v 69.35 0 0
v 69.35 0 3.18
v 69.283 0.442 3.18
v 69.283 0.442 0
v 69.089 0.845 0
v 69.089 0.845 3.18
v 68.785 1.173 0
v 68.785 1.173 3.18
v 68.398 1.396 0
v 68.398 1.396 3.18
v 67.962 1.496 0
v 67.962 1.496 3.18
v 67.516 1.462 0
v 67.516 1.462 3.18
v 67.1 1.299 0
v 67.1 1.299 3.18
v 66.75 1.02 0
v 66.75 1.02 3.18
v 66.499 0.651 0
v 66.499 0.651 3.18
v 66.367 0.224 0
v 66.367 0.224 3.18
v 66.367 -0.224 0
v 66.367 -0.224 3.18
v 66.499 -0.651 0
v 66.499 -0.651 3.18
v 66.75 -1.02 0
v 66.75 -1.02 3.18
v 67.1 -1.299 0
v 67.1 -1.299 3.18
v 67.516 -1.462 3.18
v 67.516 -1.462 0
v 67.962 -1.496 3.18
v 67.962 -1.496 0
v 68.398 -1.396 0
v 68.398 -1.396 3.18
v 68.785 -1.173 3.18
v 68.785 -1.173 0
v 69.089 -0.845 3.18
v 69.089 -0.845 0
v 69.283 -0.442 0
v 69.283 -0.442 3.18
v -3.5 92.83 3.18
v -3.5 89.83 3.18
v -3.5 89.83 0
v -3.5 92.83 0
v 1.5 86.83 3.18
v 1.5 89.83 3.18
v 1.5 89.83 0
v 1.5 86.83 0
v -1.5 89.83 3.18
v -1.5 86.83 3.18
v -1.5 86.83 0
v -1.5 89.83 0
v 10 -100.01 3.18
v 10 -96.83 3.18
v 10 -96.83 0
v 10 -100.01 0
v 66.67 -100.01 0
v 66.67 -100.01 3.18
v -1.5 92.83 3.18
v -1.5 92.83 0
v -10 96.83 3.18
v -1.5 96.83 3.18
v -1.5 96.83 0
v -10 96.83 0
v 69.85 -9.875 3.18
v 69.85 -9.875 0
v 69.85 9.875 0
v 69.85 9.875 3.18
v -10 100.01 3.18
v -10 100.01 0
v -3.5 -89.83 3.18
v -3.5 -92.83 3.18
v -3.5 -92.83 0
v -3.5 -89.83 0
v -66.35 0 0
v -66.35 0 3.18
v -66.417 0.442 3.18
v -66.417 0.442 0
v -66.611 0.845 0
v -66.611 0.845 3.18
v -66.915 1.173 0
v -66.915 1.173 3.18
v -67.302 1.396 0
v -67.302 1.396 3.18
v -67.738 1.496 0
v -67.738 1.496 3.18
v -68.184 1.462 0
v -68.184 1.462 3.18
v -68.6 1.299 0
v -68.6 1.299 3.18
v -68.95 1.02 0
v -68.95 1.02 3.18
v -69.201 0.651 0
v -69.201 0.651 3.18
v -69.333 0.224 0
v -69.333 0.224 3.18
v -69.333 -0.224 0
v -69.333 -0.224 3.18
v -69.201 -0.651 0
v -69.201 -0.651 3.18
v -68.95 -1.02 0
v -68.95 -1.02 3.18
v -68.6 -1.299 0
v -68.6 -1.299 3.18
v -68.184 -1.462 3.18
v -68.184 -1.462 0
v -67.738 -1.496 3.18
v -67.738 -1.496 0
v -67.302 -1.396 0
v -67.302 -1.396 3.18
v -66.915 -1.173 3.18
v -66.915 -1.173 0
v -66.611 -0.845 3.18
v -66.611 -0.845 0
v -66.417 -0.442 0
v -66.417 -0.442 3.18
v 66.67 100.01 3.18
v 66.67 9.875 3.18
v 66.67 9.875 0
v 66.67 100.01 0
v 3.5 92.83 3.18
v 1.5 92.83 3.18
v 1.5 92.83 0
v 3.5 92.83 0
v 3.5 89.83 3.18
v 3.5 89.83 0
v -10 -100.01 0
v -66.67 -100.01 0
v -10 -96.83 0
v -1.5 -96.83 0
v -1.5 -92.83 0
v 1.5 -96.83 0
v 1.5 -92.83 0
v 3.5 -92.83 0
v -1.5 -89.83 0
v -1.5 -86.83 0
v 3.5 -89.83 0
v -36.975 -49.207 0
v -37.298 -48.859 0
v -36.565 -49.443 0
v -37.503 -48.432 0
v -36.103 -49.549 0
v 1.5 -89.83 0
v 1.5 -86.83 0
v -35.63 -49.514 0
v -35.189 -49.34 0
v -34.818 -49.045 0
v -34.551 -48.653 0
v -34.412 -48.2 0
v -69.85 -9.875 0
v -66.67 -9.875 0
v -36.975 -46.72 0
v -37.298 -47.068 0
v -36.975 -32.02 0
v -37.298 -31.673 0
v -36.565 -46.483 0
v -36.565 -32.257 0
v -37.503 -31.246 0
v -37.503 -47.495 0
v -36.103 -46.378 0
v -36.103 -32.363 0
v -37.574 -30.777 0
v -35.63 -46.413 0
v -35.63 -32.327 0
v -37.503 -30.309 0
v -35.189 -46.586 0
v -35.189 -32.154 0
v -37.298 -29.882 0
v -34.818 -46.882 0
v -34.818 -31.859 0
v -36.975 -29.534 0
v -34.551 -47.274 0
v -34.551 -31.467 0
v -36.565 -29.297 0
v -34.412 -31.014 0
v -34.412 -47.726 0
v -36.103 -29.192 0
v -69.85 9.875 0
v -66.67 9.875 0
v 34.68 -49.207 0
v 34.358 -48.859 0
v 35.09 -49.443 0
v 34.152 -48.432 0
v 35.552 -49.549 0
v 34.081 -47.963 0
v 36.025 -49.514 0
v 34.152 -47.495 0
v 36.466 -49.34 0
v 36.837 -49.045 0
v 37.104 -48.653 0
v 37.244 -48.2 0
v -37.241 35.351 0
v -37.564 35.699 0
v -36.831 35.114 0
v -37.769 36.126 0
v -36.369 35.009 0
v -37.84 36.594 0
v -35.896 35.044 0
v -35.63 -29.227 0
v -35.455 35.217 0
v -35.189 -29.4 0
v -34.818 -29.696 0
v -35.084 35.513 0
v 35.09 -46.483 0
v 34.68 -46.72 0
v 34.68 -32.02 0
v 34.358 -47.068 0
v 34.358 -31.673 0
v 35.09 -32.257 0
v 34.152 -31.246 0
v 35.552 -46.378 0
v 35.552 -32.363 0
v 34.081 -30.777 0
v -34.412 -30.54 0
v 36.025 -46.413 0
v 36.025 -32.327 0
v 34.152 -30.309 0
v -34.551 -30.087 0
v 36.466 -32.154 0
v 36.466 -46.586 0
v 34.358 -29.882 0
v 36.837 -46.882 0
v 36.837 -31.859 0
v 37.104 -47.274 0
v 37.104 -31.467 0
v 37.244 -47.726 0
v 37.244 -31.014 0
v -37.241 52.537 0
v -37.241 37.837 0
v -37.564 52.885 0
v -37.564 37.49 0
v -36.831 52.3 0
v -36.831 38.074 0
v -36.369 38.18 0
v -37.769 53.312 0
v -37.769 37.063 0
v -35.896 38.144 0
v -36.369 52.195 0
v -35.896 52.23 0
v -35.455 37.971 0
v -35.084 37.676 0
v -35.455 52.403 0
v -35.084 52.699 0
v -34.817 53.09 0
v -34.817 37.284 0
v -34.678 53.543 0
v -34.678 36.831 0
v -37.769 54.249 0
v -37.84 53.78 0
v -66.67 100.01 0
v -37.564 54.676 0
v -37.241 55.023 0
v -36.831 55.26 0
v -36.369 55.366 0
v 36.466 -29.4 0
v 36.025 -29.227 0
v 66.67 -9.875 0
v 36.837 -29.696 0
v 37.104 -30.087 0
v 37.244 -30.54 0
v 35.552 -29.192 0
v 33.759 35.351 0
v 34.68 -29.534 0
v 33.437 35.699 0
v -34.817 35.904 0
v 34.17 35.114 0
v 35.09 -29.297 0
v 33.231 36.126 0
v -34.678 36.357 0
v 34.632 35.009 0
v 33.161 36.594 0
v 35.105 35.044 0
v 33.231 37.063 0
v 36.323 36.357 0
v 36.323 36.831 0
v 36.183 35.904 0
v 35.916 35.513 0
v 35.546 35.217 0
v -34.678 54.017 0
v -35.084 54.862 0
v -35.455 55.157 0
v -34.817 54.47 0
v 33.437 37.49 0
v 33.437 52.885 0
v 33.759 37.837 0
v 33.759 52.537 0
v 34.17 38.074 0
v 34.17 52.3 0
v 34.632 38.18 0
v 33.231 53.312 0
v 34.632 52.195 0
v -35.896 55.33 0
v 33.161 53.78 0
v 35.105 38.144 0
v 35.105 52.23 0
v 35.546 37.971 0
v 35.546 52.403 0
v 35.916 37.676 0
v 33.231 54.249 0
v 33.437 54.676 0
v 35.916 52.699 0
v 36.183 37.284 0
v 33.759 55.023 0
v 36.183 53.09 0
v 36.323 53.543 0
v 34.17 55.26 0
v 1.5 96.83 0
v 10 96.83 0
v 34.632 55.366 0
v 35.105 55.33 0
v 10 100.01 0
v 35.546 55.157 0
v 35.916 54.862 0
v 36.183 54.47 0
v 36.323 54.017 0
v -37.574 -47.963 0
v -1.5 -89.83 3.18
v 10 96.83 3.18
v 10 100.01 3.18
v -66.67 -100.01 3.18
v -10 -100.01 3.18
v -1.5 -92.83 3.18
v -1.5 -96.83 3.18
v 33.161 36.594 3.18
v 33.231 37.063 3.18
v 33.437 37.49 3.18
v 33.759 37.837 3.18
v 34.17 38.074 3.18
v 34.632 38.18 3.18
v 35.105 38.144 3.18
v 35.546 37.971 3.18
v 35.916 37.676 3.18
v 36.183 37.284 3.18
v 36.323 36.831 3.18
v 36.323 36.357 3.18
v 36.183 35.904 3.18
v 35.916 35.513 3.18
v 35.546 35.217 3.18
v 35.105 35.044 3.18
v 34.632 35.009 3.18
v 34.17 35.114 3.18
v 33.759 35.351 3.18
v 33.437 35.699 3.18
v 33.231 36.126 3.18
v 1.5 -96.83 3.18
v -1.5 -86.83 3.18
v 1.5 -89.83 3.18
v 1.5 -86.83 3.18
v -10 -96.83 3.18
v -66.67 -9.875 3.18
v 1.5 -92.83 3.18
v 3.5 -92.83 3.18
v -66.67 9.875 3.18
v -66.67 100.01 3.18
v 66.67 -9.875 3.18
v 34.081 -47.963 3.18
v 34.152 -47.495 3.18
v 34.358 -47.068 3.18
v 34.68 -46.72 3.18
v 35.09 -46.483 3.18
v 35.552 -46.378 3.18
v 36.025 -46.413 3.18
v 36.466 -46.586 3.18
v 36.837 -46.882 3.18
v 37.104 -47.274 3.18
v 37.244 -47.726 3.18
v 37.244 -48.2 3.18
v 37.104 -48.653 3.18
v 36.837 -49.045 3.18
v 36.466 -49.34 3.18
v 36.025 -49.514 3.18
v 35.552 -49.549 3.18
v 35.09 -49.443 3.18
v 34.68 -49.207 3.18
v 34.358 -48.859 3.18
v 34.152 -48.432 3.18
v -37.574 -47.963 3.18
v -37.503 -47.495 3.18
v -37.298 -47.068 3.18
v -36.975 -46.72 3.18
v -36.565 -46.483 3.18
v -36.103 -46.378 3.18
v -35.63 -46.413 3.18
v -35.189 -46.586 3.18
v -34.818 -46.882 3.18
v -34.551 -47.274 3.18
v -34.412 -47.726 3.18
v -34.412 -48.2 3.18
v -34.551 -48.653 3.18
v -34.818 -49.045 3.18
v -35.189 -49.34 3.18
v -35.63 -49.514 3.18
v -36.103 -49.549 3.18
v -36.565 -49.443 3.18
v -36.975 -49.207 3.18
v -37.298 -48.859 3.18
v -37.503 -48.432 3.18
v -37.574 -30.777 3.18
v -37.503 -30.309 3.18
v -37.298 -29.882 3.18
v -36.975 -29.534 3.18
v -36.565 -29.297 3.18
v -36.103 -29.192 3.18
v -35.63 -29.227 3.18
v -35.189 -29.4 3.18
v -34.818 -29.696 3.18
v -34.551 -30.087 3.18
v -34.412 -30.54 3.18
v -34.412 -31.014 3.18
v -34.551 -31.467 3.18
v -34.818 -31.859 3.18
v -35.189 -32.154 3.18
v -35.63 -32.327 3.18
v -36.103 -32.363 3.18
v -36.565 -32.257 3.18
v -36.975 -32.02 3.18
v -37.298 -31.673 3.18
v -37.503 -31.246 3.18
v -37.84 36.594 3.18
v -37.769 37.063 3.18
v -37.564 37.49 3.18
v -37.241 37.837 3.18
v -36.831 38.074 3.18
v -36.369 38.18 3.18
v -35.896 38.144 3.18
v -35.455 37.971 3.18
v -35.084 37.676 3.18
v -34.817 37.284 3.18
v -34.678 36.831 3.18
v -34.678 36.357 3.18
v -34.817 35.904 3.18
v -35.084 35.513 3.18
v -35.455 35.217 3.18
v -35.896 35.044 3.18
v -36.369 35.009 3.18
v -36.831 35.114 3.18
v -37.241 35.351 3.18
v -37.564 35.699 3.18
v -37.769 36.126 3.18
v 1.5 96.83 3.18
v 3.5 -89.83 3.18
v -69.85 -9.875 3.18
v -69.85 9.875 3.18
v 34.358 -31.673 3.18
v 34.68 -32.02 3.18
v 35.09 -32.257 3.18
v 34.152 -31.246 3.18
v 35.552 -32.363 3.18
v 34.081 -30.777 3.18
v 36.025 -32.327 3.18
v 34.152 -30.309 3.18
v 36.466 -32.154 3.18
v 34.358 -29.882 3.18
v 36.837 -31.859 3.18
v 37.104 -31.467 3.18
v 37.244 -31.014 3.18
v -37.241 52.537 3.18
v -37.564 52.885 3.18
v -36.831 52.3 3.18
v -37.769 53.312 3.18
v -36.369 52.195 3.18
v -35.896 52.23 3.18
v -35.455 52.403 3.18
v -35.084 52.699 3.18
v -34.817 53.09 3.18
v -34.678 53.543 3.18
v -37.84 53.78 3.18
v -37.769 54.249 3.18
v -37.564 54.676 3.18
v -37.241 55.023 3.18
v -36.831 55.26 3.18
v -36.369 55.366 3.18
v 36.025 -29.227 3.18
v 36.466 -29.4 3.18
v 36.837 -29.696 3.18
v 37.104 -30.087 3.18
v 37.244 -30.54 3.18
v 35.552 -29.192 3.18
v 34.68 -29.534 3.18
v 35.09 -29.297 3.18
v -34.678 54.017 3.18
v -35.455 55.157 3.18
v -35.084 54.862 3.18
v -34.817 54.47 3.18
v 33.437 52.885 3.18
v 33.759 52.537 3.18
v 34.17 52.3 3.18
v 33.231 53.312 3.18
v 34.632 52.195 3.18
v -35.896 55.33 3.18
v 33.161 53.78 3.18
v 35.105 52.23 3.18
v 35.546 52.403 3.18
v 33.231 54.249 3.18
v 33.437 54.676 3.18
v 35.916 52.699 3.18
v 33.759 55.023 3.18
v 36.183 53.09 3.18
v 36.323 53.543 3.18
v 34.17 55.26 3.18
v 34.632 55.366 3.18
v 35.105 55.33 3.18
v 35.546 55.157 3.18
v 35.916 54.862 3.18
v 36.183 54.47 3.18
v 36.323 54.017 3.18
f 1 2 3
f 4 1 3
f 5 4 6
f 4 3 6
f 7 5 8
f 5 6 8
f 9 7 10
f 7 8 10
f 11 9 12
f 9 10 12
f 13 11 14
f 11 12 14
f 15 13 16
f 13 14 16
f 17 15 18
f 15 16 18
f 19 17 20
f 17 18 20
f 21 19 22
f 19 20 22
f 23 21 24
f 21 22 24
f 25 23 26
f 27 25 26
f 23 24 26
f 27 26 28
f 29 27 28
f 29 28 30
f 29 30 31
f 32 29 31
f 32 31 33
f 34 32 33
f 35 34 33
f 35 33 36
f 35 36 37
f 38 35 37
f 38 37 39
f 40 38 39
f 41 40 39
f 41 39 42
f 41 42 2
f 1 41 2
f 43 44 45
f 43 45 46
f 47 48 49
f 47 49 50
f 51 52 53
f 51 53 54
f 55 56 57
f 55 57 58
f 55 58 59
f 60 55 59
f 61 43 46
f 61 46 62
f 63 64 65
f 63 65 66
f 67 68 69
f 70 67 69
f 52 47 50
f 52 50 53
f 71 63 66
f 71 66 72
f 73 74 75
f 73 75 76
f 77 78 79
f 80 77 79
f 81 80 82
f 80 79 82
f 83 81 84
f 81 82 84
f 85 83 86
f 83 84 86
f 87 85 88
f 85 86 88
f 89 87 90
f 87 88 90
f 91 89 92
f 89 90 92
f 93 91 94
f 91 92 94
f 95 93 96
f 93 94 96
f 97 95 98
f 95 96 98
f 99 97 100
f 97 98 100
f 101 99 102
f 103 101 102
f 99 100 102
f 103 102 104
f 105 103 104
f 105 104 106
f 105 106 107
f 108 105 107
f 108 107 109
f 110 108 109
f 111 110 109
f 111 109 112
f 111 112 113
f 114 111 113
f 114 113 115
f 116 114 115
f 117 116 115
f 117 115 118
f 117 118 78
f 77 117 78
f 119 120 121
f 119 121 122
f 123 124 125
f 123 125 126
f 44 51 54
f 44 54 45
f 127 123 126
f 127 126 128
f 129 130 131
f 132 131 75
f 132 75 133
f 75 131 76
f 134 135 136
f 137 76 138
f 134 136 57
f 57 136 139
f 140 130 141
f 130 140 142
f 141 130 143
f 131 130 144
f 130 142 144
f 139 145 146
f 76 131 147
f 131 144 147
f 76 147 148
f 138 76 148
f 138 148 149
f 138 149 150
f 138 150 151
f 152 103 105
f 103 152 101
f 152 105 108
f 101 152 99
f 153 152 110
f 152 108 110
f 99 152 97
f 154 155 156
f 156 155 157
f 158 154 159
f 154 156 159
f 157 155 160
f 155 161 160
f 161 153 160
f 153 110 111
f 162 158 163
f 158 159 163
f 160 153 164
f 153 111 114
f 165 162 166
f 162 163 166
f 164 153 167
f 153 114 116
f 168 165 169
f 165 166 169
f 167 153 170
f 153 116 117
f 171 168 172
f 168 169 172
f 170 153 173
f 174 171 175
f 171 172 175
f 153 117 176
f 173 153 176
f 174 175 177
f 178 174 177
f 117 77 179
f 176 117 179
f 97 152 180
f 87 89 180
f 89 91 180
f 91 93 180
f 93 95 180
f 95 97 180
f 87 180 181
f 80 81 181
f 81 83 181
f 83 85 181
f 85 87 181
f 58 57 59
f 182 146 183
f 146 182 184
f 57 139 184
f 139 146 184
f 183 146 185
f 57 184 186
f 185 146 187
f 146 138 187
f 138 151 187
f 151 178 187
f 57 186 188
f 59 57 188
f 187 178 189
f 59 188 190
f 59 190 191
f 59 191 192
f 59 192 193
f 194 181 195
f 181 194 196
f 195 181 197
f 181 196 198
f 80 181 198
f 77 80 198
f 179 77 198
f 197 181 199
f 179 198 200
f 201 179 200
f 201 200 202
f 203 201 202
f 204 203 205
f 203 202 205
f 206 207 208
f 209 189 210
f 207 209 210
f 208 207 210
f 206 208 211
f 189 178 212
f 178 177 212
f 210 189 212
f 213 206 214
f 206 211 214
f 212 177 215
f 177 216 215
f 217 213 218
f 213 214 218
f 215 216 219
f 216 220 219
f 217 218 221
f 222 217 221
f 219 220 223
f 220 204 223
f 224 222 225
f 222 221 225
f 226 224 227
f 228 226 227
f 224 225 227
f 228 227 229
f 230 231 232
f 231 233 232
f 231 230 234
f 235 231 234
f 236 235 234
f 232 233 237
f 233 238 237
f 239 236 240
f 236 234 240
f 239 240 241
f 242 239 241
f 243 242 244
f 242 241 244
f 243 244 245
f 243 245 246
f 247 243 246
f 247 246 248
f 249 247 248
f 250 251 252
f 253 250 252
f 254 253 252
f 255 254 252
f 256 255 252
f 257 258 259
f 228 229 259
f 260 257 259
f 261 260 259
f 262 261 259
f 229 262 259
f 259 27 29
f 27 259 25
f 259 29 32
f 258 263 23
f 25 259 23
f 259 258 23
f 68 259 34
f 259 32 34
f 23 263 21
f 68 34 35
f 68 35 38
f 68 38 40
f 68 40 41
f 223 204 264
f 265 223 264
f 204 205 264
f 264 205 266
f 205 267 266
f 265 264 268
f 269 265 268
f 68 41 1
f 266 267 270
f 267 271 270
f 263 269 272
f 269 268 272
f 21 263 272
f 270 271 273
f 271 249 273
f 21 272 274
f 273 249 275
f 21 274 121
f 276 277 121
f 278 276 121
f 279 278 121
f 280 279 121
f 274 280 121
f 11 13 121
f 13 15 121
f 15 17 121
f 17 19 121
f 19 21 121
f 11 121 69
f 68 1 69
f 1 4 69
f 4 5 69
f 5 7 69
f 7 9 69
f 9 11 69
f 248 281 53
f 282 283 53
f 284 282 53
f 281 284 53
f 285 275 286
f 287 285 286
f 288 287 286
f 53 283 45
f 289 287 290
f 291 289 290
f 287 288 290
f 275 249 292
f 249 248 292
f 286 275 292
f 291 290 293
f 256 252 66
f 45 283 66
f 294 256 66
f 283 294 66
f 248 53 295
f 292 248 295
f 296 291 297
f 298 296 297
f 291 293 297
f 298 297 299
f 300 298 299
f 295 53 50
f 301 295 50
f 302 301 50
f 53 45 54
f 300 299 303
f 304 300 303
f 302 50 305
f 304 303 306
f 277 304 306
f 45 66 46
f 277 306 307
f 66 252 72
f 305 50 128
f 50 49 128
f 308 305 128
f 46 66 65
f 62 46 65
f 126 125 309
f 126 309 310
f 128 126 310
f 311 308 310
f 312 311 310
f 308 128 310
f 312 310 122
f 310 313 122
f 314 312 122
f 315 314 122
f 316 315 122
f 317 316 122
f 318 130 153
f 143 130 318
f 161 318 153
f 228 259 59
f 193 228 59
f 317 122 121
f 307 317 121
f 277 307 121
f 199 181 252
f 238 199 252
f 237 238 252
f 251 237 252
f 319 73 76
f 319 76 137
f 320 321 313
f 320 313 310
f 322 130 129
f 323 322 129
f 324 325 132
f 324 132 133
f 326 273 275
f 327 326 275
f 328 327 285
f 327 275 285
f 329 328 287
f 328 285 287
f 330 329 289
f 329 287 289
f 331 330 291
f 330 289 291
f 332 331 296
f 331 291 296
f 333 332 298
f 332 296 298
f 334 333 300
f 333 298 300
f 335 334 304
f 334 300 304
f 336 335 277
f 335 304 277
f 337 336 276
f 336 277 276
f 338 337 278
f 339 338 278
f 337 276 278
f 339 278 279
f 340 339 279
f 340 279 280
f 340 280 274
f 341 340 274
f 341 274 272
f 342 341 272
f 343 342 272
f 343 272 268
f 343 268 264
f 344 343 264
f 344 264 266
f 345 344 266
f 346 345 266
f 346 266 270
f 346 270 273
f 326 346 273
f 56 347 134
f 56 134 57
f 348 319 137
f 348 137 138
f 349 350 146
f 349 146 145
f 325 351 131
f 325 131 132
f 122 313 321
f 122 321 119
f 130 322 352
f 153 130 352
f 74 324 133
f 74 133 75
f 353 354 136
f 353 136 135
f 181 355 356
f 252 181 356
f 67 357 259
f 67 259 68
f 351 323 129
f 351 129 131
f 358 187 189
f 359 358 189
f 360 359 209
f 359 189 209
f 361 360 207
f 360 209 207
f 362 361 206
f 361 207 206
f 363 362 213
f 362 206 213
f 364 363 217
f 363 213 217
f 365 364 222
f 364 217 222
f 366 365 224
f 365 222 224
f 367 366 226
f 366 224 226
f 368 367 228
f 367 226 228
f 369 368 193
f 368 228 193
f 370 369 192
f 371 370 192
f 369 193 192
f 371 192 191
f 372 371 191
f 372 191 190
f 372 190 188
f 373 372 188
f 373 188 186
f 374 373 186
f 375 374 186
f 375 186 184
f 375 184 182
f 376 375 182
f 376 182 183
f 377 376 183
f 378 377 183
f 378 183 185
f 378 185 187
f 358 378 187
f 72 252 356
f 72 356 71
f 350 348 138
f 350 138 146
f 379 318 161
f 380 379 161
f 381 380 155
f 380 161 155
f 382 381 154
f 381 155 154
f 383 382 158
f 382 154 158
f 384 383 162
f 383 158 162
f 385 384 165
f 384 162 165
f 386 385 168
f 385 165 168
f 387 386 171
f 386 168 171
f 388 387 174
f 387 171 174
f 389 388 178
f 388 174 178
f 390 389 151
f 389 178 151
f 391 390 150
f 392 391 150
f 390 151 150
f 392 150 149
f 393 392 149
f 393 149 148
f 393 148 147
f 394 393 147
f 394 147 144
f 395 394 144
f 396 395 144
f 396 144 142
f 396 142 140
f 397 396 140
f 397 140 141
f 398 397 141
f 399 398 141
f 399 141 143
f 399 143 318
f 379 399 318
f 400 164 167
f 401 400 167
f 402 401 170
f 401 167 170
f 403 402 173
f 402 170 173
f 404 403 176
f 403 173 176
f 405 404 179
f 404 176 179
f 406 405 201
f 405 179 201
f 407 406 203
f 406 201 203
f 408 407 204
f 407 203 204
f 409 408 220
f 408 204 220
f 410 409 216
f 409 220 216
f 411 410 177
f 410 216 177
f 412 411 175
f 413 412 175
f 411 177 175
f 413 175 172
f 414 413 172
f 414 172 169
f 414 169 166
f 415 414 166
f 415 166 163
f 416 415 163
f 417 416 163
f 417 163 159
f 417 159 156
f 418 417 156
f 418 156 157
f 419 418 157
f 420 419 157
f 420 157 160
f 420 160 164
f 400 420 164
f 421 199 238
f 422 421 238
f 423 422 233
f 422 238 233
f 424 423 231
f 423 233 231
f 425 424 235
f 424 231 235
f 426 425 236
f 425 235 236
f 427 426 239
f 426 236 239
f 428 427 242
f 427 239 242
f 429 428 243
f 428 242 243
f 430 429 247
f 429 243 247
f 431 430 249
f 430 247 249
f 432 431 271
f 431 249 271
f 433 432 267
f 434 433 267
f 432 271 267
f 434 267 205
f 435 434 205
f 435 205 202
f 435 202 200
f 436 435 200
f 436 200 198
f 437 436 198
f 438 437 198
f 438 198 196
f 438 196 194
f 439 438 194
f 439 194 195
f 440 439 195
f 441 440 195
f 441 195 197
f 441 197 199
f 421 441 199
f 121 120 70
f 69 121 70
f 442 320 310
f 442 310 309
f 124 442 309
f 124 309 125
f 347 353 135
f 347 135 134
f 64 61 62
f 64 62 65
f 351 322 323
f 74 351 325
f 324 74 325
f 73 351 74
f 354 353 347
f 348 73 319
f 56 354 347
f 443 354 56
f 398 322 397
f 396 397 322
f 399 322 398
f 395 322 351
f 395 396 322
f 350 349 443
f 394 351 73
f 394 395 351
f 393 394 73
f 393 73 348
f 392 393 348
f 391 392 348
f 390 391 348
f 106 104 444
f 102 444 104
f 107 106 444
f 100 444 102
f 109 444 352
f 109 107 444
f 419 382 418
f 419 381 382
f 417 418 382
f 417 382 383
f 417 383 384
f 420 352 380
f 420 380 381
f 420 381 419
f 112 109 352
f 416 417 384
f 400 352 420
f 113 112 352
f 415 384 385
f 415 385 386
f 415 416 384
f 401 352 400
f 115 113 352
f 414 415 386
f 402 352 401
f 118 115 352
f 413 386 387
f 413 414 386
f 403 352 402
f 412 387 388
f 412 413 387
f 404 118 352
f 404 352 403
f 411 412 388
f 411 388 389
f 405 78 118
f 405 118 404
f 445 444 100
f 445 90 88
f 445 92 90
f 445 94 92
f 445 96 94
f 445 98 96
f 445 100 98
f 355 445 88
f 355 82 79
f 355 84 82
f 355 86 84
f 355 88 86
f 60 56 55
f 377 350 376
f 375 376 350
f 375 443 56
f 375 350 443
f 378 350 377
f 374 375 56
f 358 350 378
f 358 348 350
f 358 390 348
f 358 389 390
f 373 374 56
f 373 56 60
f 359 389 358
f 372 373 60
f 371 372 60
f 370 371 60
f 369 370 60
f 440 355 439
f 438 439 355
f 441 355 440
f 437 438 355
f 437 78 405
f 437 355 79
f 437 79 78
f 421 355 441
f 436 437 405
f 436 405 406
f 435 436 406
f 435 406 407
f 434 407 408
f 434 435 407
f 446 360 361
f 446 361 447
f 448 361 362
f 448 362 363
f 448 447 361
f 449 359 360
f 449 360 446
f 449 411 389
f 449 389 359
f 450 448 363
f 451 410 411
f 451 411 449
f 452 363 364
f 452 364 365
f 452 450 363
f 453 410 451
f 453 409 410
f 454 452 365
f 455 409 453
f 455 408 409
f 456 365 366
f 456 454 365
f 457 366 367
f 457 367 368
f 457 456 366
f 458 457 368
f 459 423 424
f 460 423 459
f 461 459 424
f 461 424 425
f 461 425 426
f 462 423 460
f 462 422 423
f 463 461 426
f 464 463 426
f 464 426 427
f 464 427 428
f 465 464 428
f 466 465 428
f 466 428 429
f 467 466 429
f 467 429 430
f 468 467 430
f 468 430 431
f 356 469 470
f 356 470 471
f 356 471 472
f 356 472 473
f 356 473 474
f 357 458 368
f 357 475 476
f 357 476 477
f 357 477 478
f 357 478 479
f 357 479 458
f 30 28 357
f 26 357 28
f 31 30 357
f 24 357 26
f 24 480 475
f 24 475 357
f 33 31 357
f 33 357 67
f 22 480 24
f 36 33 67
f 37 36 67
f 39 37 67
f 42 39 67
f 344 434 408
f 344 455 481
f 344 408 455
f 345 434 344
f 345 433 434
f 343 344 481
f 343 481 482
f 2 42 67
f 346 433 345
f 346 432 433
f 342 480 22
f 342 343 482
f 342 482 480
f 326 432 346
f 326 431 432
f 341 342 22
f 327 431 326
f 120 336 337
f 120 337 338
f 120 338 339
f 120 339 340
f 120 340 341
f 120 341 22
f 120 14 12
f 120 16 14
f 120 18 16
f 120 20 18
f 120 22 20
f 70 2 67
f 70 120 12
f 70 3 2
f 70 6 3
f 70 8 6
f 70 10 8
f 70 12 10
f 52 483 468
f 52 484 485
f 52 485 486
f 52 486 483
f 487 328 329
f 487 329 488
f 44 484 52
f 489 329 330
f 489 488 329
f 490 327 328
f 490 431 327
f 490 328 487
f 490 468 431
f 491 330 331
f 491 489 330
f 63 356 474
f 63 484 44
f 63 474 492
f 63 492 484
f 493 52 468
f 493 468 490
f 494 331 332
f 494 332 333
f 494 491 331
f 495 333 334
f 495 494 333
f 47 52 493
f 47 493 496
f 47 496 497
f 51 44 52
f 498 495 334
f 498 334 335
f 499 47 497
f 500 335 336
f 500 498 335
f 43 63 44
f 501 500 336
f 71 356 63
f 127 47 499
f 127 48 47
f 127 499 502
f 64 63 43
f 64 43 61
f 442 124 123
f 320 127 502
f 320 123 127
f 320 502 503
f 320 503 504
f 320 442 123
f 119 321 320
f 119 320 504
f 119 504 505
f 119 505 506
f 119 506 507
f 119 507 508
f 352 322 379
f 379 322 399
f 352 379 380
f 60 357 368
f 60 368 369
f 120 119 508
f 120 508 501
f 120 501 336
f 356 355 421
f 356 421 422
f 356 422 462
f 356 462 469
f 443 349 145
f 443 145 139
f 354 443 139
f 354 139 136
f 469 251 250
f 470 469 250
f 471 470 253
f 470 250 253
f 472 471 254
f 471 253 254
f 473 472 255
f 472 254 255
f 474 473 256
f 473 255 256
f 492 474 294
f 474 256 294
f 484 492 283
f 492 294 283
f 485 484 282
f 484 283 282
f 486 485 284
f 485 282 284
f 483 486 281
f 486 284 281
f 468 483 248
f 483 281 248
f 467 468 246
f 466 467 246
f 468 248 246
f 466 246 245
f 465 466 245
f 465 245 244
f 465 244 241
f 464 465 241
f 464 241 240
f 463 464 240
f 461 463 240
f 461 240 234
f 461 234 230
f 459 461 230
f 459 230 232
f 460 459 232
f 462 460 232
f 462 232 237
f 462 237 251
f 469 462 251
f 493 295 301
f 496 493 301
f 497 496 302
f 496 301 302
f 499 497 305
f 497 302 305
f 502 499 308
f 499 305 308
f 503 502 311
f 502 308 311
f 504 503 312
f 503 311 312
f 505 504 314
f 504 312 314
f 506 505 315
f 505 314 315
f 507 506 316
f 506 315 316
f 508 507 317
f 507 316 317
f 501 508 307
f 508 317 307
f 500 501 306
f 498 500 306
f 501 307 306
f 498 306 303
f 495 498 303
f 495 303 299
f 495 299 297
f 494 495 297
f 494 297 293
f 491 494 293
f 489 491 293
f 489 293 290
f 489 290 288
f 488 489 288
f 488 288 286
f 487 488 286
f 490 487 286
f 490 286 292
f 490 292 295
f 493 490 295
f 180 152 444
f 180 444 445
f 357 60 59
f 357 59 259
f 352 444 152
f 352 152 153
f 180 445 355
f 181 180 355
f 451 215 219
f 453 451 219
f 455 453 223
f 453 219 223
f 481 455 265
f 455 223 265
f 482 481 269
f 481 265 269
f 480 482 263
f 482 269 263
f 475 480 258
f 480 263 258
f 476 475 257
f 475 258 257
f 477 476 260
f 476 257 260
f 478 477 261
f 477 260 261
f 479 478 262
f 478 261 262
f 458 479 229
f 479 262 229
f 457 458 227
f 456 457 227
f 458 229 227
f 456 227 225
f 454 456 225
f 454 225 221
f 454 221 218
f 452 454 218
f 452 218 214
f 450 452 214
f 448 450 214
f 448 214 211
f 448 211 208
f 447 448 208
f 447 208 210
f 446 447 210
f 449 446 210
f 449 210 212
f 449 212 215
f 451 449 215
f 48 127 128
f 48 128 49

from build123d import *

# Parameters (mm, degrees)
SKETCH1_W           = 139.7
SKETCH1_H           = 200.02
BOSS_EXTRUDE1_DEPTH = 3.18
SKETCH2_R           = 1.5
SKETCH2_W           = 3.18
SKETCH2_H           = 90.135
CUT_EXTRUDE1_DEPTH  = 4.18
SKETCH3_R           = 1.59
CUT_EXTRUDE2_DEPTH  = 4.18
SKETCH4_R           = 1.59
CUT_EXTRUDE3_DEPTH  = 4.18


with BuildPart() as part:
    # Sketch1 → Boss-Extrude1 (new body)
    with BuildSketch(Plane.XY):
        Rectangle(SKETCH1_W, SKETCH1_H)
    extrude(amount=BOSS_EXTRUDE1_DEPTH)

    # Sketch2 → Cut-Extrude1 (cut, through all)
    with BuildSketch(Plane.XY.offset(3.18)):
        with Locations((-67.85, 0)):
            Circle(SKETCH2_R)
        with Locations((67.85, 0)):
            Circle(SKETCH2_R)
        Polygon((-10, 100.01), (10, 100.01), (10, 96.83), (1.5, 96.83), (1.5, 92.83), (3.5, 92.83), (3.5, 89.83), (1.5, 89.83), (1.5, 86.83), (-1.5, 86.83), (-1.5, 89.83), (-3.5, 89.83), (-3.5, 92.83), (-1.5, 92.83), (-1.5, 96.83), (-10, 96.83), align=None)
        Polygon((-10, -100.01), (-10, -96.83), (-1.5, -96.83), (-1.5, -92.83), (-3.5, -92.83), (-3.5, -89.83), (-1.5, -89.83), (-1.5, -86.83), (1.5, -86.83), (1.5, -89.83), (3.5, -89.83), (3.5, -92.83), (1.5, -92.83), (1.5, -96.83), (10, -96.83), (10, -100.01), align=None)
        with Locations((-68.26, 54.9425)):
            Rectangle(SKETCH2_W, SKETCH2_H)
        with Locations((-68.26, -54.9425)):
            Rectangle(SKETCH2_W, SKETCH2_H)
        with Locations((68.26, -54.9425)):
            Rectangle(SKETCH2_W, SKETCH2_H)
        with Locations((68.26, 54.9425)):
            Rectangle(SKETCH2_W, SKETCH2_H)
    extrude(amount=-CUT_EXTRUDE1_DEPTH, mode=Mode.SUBTRACT)

    # Sketch3 → Cut-Extrude2 (cut, through all)
    with BuildSketch(Plane(origin=(0, 0, 0), x_dir=(-1, 0, 0), z_dir=(0, 0, -1))):
        with Locations((-35.67127699, -47.963396943)):
            Circle(SKETCH3_R)
        with Locations((-35.67127699, -30.777287406)):
            Circle(SKETCH3_R)
    extrude(amount=-CUT_EXTRUDE2_DEPTH, mode=Mode.SUBTRACT)

    # Sketch4 → Cut-Extrude3 (cut, through all)
    with BuildSketch(Plane(origin=(0, 0, 0), x_dir=(-1, 0, 0), z_dir=(0, 0, -1))):
        with Locations((-34.750723073, 53.780323187)):
            Circle(SKETCH4_R)
        with Locations((-34.750723073, 36.59421365)):
            Circle(SKETCH4_R)
        with Locations((36.249784221, 53.780323187)):
            Circle(SKETCH4_R)
        with Locations((36.249784221, 36.59421365)):
            Circle(SKETCH4_R)
        with Locations((35.983928162, -30.777287406)):
            Circle(SKETCH4_R)
        with Locations((35.983928162, -47.963396943)):
            Circle(SKETCH4_R)
        with Locations((-35.67127699, -30.777287406)):
            Circle(SKETCH4_R)
        with Locations((-35.67127699, -47.963396943)):
            Circle(SKETCH4_R)
    extrude(amount=-CUT_EXTRUDE3_DEPTH, mode=Mode.SUBTRACT)


solid = part.part
